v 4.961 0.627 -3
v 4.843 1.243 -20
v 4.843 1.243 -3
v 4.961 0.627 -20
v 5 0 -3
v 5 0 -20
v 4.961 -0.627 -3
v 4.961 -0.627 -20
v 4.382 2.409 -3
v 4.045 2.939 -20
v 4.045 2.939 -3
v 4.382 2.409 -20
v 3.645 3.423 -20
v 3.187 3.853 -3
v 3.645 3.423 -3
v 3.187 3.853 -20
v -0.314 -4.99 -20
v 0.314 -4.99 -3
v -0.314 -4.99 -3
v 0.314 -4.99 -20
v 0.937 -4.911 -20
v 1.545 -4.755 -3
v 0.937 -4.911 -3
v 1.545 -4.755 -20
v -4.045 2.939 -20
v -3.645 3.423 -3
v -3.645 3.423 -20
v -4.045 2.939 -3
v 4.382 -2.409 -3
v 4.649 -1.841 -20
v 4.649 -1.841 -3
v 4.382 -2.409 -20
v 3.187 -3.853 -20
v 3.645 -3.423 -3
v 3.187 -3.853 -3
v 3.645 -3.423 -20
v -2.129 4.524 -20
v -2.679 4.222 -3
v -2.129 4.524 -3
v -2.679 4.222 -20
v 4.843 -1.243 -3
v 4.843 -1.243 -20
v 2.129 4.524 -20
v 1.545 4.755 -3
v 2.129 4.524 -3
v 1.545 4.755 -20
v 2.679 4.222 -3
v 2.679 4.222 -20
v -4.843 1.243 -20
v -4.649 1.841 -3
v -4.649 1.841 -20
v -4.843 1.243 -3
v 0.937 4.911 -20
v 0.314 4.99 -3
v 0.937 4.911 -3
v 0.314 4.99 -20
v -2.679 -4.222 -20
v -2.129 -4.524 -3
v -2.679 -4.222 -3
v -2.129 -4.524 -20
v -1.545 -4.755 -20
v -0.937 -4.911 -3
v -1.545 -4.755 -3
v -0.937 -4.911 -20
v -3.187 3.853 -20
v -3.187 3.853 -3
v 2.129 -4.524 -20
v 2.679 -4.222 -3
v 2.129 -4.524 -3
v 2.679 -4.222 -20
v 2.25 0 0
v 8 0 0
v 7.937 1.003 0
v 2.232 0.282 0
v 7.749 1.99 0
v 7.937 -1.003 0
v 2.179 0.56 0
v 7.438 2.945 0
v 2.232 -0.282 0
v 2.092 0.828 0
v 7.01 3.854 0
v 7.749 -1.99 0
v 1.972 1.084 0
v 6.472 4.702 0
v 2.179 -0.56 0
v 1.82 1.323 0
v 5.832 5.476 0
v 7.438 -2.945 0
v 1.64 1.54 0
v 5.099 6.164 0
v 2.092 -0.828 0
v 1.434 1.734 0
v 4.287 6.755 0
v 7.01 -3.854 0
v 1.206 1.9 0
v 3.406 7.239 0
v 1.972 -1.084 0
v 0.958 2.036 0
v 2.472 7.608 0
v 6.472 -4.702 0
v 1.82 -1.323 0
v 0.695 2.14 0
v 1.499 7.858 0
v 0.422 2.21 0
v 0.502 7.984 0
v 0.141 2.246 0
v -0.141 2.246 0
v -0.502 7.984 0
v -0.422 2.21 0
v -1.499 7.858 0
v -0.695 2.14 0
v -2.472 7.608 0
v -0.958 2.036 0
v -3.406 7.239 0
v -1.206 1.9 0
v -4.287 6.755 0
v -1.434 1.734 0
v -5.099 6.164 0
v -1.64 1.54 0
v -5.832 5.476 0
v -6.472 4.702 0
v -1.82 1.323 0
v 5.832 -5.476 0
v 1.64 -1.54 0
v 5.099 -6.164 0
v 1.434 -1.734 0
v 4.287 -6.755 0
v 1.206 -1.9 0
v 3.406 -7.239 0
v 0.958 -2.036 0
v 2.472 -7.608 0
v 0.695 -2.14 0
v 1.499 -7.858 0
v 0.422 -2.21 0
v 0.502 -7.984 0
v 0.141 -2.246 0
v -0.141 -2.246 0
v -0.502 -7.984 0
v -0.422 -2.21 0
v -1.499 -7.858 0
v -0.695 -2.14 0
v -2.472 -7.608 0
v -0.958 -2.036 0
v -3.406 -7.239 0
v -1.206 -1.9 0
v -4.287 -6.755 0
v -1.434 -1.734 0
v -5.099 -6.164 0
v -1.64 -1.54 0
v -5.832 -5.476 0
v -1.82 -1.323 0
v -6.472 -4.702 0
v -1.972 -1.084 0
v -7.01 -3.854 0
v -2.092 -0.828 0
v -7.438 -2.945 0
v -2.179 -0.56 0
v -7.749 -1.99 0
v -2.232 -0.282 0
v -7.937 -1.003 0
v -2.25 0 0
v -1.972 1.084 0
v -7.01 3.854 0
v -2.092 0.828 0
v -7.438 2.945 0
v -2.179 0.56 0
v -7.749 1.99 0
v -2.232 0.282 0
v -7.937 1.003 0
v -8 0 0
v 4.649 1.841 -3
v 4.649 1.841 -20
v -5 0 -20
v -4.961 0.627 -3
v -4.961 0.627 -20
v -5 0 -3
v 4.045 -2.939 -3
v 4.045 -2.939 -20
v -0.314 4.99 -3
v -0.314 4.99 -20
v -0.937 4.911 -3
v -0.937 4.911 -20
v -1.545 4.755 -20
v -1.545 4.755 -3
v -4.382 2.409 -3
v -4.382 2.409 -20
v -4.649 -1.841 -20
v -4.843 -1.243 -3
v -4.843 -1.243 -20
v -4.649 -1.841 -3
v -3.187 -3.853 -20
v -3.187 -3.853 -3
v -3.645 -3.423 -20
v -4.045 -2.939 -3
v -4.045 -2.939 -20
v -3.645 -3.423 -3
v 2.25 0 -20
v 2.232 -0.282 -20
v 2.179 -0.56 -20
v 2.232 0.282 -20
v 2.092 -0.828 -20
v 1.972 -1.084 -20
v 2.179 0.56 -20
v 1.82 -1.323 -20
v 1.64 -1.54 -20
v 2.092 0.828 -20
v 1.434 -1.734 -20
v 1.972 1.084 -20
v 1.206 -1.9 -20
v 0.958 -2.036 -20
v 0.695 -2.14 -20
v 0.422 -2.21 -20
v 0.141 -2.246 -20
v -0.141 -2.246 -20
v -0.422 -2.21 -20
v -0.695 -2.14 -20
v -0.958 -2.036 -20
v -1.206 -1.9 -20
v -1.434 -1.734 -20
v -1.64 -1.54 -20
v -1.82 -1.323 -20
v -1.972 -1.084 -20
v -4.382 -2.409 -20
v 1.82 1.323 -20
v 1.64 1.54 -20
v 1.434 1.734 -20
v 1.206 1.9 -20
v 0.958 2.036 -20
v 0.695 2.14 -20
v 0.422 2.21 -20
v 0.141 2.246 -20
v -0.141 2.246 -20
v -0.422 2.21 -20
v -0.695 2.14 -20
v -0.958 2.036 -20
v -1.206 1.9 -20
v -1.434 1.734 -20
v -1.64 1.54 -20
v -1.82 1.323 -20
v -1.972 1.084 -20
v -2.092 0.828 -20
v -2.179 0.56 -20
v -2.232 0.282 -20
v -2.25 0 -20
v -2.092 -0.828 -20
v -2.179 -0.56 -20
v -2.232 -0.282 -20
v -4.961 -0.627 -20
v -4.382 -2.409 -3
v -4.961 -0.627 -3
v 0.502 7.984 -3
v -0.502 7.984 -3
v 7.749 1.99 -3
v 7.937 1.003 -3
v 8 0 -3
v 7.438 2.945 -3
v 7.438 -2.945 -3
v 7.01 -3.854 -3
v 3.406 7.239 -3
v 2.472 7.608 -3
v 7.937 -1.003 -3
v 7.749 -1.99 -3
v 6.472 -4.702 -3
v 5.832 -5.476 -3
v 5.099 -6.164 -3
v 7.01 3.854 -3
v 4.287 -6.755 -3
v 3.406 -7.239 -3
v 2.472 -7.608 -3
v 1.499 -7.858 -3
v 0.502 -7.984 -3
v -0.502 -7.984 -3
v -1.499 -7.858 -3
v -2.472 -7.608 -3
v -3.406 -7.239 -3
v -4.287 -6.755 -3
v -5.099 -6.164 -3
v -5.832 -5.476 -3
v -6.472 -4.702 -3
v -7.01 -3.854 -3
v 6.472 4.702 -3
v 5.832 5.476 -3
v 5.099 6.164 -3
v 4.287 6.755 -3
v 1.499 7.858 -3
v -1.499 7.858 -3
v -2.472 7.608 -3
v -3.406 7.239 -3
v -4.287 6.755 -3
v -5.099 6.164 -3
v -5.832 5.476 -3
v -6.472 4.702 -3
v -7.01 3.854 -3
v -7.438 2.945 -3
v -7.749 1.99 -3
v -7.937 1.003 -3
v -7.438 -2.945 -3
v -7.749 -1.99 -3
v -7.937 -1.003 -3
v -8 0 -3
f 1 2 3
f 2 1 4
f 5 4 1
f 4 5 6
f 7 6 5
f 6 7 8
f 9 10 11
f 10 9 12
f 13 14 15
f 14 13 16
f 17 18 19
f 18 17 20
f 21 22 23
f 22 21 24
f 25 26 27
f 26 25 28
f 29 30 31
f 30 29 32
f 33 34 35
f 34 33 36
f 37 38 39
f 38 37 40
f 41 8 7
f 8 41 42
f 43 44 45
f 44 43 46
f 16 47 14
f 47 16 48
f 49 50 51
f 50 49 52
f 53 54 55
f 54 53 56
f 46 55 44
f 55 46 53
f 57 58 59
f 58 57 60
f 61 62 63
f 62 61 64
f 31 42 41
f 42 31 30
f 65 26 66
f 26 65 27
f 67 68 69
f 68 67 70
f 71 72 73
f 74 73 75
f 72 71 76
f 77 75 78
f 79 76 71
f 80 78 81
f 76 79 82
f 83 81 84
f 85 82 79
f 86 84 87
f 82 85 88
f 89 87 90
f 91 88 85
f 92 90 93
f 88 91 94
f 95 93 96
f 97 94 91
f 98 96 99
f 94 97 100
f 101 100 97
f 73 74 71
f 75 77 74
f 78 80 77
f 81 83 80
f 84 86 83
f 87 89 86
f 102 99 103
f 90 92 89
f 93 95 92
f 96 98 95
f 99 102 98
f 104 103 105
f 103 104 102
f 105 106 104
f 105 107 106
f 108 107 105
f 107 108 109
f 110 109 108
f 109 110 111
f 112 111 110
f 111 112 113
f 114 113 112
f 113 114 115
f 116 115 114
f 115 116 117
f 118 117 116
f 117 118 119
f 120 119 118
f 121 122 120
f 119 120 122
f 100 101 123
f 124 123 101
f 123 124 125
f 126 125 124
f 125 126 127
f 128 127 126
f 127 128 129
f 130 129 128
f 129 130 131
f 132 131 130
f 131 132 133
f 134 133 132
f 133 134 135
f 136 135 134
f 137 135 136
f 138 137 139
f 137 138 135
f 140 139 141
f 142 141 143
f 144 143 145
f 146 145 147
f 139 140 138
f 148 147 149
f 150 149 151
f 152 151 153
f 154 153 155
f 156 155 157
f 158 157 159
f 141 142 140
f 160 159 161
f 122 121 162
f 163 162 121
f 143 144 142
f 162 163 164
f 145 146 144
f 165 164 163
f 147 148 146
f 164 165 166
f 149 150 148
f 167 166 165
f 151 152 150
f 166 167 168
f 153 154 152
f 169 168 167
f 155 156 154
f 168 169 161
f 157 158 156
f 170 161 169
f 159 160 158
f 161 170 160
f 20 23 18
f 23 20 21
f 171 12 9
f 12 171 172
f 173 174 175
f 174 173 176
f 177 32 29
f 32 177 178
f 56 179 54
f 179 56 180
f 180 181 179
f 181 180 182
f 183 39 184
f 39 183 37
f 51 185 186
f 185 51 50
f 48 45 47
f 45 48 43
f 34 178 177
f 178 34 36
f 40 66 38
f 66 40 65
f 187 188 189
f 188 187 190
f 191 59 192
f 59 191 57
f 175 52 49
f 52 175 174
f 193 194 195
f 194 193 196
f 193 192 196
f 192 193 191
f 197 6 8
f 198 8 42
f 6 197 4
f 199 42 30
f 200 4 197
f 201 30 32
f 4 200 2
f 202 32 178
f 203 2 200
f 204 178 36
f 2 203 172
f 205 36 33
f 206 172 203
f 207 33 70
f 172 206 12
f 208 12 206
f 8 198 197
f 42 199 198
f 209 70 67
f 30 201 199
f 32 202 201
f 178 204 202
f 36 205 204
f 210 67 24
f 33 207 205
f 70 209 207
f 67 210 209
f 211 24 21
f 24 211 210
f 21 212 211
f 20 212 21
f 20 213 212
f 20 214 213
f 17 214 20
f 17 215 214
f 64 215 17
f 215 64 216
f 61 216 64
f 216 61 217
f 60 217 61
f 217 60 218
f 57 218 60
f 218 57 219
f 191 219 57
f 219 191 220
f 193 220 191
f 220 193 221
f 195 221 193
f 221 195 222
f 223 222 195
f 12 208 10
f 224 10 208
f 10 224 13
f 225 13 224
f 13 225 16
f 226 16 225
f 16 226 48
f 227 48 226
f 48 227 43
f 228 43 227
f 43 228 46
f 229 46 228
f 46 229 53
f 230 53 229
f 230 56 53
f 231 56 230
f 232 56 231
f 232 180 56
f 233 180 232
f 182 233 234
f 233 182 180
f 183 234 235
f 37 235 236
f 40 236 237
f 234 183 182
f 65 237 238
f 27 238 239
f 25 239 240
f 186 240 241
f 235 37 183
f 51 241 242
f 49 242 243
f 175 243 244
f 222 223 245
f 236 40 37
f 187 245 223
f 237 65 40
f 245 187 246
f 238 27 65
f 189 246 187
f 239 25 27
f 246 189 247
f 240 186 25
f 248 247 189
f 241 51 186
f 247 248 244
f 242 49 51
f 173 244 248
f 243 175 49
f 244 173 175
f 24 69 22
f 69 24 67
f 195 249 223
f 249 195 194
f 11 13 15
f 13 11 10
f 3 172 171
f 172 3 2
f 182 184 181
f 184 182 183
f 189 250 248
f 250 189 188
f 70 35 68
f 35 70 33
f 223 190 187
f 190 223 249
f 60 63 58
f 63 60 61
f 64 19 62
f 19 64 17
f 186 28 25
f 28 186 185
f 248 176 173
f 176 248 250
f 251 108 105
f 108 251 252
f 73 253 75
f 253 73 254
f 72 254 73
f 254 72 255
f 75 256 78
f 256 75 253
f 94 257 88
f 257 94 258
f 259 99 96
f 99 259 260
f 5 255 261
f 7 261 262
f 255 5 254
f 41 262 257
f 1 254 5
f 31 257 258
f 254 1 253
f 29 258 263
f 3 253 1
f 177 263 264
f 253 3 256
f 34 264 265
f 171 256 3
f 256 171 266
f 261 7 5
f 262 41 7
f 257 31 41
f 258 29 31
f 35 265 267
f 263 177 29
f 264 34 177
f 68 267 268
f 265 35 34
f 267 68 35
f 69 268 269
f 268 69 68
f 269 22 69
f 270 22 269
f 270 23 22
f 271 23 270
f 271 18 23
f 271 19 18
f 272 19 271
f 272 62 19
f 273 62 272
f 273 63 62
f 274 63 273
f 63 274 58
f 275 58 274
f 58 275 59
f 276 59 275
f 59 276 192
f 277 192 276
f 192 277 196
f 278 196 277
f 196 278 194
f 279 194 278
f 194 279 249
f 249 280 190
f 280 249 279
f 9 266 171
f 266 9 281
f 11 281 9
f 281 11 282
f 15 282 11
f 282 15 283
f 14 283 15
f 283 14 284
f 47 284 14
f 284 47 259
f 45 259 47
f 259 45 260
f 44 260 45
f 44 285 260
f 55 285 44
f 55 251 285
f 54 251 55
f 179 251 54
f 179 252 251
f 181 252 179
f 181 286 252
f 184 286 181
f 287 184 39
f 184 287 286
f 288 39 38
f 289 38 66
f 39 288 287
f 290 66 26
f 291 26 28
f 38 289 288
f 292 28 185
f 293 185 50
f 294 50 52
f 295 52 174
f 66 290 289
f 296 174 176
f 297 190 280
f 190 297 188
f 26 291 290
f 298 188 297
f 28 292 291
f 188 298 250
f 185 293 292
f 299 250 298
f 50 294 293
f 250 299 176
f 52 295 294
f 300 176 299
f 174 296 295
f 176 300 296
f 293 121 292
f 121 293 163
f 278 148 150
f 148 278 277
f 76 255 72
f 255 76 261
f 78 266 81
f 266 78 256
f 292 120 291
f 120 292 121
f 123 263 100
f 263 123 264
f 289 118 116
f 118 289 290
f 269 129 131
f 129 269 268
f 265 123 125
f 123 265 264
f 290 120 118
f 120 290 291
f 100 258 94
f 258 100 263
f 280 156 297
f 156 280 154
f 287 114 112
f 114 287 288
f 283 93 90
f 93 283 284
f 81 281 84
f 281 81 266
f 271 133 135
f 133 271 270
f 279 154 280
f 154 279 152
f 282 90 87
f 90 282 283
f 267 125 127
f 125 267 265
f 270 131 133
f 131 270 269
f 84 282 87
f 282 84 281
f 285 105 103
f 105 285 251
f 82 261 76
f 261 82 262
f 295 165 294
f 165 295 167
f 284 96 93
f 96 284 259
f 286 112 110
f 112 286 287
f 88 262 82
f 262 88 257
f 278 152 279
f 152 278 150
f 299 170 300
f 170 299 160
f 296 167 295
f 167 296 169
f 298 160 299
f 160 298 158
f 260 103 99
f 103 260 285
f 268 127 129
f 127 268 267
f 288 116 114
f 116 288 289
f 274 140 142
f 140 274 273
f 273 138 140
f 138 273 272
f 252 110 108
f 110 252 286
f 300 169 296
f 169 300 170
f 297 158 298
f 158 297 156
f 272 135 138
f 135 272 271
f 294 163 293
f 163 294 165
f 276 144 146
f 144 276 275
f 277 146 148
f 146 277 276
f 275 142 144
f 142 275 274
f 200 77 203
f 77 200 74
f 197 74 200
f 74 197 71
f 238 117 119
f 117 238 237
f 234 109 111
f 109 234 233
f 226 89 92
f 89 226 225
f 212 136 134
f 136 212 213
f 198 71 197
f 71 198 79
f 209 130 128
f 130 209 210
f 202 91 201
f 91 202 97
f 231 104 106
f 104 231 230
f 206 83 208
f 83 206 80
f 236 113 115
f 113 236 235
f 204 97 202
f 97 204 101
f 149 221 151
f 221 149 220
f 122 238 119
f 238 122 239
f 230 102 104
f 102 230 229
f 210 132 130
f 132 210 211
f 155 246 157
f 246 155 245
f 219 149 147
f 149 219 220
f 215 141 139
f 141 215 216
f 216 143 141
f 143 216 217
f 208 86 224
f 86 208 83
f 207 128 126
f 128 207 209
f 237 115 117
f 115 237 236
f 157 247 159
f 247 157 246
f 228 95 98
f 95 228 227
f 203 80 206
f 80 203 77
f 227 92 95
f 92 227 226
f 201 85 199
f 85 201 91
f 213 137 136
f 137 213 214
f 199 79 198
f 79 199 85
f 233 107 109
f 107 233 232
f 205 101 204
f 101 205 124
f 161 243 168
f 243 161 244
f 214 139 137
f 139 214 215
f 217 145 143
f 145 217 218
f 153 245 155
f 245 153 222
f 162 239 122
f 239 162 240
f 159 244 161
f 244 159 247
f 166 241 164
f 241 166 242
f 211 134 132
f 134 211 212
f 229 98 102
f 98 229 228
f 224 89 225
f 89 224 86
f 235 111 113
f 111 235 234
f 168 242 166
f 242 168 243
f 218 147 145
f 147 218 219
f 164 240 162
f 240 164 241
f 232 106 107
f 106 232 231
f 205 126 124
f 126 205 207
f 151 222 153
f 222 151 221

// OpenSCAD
$fn = 50;


difference() {
	union() {
		translate(v = [0, 0, -20.0000000000]) {
			cylinder(h = 20, r = 5.0000000000);
		}
		translate(v = [0, 0, -3.0000000000]) {
			cylinder(h = 3, r = 8.0000000000);
		}
	}
	union() {
		#translate(v = [0, 0, -20]) {
			cylinder(h = 20, r = 2.2500000000);
		}
	}
}
